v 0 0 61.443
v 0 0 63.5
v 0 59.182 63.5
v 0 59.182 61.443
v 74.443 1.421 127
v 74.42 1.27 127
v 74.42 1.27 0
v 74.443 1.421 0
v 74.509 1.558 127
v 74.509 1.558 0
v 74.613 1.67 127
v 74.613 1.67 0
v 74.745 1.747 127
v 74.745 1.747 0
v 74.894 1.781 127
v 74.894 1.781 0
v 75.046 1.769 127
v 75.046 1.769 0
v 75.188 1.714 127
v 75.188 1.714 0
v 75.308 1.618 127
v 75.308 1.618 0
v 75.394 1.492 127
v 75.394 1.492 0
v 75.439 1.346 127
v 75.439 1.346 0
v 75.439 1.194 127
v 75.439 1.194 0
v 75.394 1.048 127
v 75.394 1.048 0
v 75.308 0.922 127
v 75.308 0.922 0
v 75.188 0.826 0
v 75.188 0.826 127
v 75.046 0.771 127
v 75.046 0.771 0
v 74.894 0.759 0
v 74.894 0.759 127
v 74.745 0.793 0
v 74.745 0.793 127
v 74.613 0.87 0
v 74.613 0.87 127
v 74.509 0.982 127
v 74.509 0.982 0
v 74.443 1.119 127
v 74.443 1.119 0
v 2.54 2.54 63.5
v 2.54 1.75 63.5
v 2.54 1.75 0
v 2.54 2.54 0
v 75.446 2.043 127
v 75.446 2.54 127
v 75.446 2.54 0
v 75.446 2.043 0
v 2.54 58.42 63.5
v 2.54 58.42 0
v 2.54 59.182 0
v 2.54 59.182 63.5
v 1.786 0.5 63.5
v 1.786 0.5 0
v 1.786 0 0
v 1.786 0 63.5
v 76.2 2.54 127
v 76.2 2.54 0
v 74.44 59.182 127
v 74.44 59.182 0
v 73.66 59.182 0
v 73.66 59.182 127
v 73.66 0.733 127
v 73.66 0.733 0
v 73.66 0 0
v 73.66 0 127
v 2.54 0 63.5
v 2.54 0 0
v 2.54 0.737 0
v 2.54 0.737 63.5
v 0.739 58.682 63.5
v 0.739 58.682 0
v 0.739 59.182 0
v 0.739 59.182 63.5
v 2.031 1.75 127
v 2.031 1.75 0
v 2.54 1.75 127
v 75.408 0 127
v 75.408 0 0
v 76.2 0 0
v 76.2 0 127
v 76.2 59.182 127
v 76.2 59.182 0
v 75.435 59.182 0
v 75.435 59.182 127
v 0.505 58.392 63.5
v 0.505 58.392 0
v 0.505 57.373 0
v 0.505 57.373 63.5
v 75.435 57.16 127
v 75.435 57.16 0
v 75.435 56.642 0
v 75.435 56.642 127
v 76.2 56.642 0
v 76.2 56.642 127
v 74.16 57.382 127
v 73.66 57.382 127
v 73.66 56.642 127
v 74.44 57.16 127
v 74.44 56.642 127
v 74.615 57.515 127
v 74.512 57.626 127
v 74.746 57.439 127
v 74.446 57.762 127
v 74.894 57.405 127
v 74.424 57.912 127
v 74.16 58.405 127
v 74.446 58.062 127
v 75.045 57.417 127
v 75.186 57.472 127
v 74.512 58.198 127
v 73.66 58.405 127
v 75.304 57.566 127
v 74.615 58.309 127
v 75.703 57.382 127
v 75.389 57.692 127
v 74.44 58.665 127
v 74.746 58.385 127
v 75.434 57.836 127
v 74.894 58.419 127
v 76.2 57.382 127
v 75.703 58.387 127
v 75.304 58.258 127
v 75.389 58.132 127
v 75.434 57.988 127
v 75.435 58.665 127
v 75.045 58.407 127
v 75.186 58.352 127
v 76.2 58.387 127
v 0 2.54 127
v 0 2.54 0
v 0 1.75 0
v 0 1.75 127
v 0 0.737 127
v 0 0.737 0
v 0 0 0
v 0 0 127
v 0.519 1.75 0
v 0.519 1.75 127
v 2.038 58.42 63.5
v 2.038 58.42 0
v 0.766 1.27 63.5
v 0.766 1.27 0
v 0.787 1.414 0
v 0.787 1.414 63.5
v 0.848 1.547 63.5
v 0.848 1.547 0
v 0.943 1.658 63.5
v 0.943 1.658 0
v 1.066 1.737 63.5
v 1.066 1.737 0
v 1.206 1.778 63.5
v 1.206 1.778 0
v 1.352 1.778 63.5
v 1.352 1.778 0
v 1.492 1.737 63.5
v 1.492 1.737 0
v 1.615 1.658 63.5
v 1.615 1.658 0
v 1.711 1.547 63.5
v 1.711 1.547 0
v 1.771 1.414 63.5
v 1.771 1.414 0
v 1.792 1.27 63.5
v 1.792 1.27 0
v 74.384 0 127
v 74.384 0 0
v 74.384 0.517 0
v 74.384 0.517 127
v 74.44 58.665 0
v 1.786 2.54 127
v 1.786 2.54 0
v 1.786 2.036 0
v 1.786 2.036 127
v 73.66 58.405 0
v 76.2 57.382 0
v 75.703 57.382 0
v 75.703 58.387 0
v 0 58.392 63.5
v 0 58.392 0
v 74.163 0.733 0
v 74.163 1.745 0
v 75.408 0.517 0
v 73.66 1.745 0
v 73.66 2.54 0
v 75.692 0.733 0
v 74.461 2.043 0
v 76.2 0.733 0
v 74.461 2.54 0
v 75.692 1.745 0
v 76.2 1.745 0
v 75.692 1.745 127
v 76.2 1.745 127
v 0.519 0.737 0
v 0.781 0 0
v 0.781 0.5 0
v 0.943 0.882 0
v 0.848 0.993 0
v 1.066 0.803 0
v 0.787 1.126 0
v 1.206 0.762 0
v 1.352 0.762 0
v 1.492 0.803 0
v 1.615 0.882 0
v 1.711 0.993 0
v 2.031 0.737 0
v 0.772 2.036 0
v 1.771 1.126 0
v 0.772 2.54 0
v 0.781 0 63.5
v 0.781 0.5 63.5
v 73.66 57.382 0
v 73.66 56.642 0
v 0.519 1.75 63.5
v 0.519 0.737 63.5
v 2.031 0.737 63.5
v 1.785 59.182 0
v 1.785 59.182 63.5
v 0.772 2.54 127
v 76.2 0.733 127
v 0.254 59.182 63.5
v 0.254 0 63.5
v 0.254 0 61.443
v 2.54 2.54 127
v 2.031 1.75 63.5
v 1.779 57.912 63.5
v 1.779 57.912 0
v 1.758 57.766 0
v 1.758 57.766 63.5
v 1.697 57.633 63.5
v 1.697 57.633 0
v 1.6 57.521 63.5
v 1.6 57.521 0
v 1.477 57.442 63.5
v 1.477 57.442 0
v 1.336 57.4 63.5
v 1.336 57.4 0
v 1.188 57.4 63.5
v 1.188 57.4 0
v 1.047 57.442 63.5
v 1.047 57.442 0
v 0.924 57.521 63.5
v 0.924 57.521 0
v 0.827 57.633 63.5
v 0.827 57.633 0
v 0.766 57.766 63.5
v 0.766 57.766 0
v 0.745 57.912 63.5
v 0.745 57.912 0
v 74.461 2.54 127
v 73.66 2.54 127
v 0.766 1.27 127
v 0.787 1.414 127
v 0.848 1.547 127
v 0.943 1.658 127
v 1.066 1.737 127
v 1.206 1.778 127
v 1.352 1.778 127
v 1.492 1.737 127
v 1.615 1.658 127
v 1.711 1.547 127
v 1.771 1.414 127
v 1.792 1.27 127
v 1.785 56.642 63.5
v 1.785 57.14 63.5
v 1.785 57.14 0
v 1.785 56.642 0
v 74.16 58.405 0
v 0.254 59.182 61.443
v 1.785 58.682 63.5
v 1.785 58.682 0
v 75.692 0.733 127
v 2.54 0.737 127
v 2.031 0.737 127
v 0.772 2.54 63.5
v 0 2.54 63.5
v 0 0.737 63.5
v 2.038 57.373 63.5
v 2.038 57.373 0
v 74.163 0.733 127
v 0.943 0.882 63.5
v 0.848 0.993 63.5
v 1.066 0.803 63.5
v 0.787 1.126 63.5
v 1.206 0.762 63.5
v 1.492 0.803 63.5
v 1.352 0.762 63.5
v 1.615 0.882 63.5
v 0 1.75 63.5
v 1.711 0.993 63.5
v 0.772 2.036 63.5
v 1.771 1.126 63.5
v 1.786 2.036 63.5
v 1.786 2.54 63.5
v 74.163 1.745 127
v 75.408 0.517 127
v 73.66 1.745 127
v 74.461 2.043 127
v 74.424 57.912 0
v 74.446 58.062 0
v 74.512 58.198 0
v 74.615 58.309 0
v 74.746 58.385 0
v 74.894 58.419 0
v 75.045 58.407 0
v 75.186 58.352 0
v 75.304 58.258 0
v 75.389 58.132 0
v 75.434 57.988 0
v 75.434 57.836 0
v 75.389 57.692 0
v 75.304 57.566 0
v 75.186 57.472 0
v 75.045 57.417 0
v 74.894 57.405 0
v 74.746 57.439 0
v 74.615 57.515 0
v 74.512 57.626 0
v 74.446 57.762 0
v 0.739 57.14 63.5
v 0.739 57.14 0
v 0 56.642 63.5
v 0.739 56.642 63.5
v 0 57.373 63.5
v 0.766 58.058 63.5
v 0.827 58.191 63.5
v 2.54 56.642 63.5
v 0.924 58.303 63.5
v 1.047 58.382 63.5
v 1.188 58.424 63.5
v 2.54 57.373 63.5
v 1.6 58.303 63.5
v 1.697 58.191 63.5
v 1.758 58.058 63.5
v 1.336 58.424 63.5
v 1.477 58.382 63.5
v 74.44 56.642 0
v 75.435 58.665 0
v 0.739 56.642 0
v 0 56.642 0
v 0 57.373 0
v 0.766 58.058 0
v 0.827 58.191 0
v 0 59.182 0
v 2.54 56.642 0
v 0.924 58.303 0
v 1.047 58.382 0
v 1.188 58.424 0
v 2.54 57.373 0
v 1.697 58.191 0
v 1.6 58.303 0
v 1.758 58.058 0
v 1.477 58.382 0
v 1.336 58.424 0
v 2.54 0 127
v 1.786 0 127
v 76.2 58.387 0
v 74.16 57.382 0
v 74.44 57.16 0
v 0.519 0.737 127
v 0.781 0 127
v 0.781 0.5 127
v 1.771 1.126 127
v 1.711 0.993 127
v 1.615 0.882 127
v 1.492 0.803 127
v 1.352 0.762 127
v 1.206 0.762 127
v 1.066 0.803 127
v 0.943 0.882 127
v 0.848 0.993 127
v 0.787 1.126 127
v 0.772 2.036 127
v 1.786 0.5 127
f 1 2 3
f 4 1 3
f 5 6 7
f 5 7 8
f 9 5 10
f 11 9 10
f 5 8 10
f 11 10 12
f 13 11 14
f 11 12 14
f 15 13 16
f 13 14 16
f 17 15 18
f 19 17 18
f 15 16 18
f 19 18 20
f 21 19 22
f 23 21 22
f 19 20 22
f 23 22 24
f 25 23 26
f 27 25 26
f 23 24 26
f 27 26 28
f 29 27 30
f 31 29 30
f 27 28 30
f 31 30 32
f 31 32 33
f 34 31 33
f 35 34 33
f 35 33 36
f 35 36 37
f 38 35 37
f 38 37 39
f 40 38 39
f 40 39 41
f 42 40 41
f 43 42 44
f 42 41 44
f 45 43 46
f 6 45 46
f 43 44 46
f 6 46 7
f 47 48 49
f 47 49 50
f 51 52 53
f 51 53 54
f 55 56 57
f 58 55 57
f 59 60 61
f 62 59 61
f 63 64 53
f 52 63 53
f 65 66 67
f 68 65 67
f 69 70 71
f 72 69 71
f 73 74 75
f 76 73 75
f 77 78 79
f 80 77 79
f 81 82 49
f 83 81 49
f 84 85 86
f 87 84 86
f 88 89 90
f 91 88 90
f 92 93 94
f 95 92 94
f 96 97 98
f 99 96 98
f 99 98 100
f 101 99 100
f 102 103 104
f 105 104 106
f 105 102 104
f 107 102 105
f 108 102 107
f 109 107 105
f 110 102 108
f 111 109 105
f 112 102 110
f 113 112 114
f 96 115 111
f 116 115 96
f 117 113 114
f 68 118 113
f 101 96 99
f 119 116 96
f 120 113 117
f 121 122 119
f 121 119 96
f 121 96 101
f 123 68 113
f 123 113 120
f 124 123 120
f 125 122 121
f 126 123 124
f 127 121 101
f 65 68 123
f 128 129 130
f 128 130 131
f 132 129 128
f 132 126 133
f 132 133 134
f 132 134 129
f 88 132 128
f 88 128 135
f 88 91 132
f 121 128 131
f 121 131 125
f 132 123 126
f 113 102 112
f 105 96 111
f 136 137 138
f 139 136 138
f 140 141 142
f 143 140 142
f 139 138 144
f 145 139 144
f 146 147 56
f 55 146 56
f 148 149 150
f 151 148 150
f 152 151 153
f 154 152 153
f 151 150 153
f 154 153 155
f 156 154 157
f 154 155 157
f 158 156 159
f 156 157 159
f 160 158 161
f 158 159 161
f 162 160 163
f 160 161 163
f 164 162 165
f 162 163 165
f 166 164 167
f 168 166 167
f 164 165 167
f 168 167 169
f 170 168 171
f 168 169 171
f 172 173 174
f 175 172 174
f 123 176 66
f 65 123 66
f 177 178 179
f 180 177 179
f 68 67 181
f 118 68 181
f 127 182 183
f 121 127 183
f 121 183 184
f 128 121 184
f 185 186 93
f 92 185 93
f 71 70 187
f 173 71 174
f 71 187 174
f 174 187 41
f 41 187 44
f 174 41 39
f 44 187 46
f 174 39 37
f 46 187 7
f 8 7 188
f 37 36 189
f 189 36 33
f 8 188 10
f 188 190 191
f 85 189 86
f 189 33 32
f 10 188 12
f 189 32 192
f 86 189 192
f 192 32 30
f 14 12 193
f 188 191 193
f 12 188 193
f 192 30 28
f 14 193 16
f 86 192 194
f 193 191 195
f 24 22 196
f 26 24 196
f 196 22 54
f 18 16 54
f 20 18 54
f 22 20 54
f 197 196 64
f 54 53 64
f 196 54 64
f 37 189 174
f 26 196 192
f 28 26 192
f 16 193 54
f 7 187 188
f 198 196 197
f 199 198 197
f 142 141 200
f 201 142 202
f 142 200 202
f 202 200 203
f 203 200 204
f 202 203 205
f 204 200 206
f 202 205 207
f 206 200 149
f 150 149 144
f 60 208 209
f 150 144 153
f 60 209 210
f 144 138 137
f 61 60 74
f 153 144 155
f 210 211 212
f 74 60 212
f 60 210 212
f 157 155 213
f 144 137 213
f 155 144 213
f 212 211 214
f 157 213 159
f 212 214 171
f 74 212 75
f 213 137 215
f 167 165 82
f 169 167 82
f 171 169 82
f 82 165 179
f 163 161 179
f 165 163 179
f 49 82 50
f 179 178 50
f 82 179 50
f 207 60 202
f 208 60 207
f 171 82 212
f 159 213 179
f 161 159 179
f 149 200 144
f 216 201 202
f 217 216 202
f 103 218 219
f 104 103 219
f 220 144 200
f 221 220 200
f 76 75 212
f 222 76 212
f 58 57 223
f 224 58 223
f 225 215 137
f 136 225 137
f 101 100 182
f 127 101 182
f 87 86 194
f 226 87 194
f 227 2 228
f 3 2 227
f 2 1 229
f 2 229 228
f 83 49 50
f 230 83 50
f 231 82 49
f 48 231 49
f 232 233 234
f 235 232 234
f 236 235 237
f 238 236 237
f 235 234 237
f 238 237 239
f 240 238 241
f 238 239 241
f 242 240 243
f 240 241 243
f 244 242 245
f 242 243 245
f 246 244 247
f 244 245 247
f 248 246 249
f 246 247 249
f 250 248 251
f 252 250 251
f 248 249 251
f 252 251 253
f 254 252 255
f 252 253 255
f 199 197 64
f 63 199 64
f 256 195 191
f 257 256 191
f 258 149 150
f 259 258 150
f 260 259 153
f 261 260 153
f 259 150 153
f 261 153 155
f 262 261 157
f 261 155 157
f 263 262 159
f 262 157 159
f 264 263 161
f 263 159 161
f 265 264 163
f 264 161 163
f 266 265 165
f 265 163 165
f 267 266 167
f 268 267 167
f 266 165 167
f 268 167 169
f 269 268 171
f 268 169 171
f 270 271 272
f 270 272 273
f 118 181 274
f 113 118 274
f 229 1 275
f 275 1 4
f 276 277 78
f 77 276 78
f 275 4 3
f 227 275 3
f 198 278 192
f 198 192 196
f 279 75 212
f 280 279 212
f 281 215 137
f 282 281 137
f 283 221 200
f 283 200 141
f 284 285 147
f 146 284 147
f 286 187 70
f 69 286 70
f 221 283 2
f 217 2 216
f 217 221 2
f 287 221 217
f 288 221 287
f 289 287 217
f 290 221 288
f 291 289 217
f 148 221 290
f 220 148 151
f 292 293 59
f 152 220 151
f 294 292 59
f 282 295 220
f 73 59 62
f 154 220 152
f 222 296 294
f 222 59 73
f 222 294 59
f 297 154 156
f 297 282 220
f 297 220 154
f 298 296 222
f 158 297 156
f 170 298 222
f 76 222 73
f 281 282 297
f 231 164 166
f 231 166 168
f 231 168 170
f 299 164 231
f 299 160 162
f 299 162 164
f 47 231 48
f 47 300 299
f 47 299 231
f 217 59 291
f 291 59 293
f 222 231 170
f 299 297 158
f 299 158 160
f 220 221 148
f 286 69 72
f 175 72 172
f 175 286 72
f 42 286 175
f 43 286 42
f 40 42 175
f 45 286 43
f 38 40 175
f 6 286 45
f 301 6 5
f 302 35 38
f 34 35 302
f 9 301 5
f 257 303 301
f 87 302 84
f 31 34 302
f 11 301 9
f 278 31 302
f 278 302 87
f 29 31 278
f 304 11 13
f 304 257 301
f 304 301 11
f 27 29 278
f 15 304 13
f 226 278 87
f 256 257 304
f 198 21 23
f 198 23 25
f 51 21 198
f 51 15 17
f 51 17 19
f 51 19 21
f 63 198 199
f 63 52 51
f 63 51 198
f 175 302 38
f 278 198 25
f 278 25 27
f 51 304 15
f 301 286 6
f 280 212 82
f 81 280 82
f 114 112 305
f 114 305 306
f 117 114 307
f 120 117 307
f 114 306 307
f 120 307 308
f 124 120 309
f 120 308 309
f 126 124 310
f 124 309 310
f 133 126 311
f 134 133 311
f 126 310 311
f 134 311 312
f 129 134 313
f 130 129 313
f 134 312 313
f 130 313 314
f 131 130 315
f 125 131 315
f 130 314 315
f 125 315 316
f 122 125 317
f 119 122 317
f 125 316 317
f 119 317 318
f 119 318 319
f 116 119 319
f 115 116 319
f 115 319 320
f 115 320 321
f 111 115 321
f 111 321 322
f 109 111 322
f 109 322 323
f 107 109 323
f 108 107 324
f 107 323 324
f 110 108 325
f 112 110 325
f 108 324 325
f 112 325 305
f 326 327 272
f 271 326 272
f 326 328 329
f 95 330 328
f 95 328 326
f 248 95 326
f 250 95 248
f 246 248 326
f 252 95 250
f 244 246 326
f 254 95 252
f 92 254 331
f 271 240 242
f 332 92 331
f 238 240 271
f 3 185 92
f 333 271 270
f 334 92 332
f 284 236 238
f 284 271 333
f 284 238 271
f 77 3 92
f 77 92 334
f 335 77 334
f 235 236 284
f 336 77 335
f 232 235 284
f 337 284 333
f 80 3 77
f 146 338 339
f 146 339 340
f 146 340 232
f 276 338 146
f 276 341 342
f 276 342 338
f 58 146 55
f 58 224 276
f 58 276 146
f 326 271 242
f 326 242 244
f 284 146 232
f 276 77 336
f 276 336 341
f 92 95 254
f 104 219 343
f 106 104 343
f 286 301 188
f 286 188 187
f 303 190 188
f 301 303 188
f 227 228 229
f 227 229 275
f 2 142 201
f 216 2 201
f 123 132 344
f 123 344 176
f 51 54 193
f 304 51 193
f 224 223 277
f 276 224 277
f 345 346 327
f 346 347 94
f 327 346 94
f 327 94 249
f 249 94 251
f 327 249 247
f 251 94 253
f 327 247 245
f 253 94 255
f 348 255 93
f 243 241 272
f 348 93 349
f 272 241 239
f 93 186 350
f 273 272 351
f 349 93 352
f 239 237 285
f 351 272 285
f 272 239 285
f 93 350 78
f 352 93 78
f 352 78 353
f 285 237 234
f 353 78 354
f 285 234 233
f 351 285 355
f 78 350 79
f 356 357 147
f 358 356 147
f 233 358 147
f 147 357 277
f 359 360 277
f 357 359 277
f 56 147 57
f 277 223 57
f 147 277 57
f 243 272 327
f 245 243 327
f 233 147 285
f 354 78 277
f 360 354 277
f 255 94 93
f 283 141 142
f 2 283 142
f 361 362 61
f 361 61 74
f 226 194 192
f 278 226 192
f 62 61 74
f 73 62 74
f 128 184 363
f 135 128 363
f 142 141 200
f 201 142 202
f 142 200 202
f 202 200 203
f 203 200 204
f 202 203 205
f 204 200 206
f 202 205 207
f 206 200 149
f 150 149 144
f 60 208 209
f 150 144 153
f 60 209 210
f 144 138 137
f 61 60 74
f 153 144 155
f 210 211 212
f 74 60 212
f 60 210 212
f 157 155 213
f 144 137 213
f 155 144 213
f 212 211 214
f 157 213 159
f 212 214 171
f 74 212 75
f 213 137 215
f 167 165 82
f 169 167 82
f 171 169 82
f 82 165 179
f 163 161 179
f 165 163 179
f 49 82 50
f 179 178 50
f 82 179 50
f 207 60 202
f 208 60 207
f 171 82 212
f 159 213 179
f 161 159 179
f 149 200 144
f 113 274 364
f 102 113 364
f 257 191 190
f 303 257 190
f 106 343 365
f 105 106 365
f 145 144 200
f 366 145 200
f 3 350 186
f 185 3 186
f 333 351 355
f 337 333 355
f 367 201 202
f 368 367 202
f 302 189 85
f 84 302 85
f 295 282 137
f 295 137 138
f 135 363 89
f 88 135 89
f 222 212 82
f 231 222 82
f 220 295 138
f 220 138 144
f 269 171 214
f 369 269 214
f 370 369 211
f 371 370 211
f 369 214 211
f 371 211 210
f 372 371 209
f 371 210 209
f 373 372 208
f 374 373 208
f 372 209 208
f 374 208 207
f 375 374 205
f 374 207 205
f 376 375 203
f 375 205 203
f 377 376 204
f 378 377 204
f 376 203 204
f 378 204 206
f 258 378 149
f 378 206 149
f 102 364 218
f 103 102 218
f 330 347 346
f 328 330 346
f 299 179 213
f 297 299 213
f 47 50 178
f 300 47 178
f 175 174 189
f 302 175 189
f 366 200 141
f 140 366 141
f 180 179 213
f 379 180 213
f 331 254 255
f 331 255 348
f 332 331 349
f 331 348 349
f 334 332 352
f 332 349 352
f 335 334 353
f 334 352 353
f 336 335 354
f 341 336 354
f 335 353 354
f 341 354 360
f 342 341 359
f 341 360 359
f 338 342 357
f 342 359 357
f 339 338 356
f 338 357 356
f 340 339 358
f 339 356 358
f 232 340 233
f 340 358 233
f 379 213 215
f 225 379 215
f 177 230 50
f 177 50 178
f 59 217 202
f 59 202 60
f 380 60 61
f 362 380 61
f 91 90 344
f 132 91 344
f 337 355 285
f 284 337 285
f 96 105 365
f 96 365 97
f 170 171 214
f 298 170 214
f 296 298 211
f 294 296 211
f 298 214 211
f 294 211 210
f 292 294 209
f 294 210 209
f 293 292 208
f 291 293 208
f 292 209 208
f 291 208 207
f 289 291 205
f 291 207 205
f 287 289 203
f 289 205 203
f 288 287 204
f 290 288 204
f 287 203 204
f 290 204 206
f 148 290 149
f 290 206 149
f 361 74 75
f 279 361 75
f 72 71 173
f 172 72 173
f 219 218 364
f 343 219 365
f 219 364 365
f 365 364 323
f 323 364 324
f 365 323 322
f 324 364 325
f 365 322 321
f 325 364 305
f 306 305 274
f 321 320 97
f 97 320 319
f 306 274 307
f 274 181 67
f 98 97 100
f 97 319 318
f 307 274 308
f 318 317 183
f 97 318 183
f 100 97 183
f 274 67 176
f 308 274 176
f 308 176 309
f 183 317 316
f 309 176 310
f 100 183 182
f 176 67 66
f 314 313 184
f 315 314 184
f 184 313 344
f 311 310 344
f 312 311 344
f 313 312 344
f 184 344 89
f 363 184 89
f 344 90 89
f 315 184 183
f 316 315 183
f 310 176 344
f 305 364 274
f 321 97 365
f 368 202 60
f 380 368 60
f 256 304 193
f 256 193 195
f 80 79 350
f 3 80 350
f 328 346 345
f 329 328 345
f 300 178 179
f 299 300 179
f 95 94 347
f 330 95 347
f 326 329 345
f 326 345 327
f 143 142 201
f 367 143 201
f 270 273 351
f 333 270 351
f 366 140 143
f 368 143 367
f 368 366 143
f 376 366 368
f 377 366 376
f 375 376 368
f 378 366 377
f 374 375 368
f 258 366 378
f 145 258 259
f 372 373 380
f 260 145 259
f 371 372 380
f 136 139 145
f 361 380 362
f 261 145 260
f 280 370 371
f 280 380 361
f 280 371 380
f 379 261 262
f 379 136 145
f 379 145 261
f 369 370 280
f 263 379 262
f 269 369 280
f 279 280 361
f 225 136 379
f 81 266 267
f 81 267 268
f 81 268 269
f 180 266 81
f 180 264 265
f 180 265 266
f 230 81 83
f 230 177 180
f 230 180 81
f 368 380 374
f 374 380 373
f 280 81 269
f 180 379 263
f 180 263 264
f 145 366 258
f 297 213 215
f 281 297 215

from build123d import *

# Parameters (mm, degrees)
F1_DEPTH = 127
F2_W     = 59.182
F2_H     = 2.0574
F3_DEPTH = 0.254
F4_DEPTH = 63.5


with BuildPart() as f1:
    # F0 (on Top) → F1 (new body)
    with BuildSketch(Plane.XY):
        Polygon((75.435355, 56.642), (76.2, 56.642), (76.2, 57.382349), (75.703458, 57.382349), (75.703458, 58.387429), (76.2, 58.387429), (76.2, 59.182), (75.435355, 59.182), (75.435355, 58.665238), (74.439637, 58.665238), (74.439637, 59.182), (73.66, 59.182), (73.66, 58.405377), (74.159944, 58.405377), (74.159944, 57.912), (74.159944, 57.382349), (73.66, 57.382349), (73.66, 56.642), (74.439637, 56.642), (74.439637, 57.159521), (75.435355, 57.159521), align=None)
        with BuildLine():
            ThreePointArc((75.439701, 57.912), (74.931701, 57.404), (74.423701, 57.912))
            ThreePointArc((74.423701, 57.912), (74.931701, 58.42), (75.439701, 57.912))
        make_face(mode=Mode.SUBTRACT)
        Polygon((73.66, 0.73318), (73.66, 0), (74.383944, 0), (74.383944, 0.516951), (75.407833, 0.516951), (75.407833, 0), (76.2, 0), (76.2, 0.73318), (75.692, 0.73318), (75.692, 1.745307), (76.2, 1.745307), (76.2, 2.54), (75.446472, 2.54), (75.446472, 2.043123), (74.461222, 2.043123), (74.461222, 2.54), (73.66, 2.54), (73.66, 1.745307), (74.163118, 1.745307), (74.163118, 1.27), (74.163118, 0.73318), align=None)
        with BuildLine():
            ThreePointArc((75.444446, 1.27), (74.932334, 0.757888), (74.420222, 1.27))
            ThreePointArc((74.420222, 1.27), (74.932334, 1.782112), (75.444446, 1.27))
        make_face(mode=Mode.SUBTRACT)
        Polygon((0, 0.736638), (0, 0), (0.780634, 0), (0.780634, 0.499567), (1.786142, 0.499567), (1.786142, 0), (2.54, 0), (2.54, 0.736638), (2.031388, 0.736638), (2.031388, 1.750321), (2.54, 1.750321), (2.54, 2.54), (1.786142, 2.54), (1.786142, 2.036441), (0.772459, 2.036441), (0.772459, 2.54), (0, 2.54), (0, 1.750321), (0.519038, 1.750321), (0.519038, 1.27), (0.519038, 0.736638), align=None)
        with BuildLine():
            ThreePointArc((1.792188, 1.27), (1.2793, 0.757113), (0.766413, 1.27))
            ThreePointArc((0.766413, 1.27), (1.2793, 1.782887), (1.792188, 1.27))
        make_face(mode=Mode.SUBTRACT)
    extrude(amount=F1_DEPTH)


with BuildPart() as f3:
    # F2 (on Right) → F3 (new body)
    with BuildSketch(Plane.YZ):
        with Locations((29.591, 62.4713)):
            Rectangle(F2_W, F2_H)
    extrude(amount=F3_DEPTH)


with BuildPart() as f4:
    # F0 (on Top) → F4 (new body)
    with BuildSketch(Plane.XY):
        Polygon((0, 0.736638), (0, 0), (0.780634, 0), (0.780634, 0.499567), (1.786142, 0.499567), (1.786142, 0), (2.54, 0), (2.54, 0.736638), (2.031388, 0.736638), (2.031388, 1.750321), (2.54, 1.750321), (2.54, 2.54), (1.786142, 2.54), (1.786142, 2.036441), (0.772459, 2.036441), (0.772459, 2.54), (0, 2.54), (0, 1.750321), (0.519038, 1.750321), (0.519038, 1.27), (0.519038, 0.736638), align=None)
        with BuildLine():
            ThreePointArc((1.792188, 1.27), (1.2793, 0.757113), (0.766413, 1.27))
            ThreePointArc((0.766413, 1.27), (1.2793, 1.782887), (1.792188, 1.27))
        make_face(mode=Mode.SUBTRACT)
        Polygon((0, 57.373393), (0, 56.642), (0.738544, 56.642), (0.738544, 57.139702), (1.78547, 57.139702), (1.78547, 56.642), (2.54, 56.642), (2.54, 57.373393), (2.037854, 57.373393), (2.037854, 58.42), (2.54, 58.42), (2.54, 59.182), (1.78547, 59.182), (1.78547, 58.682051), (0.738544, 58.682051), (0.738544, 59.182), (0, 59.182), (0, 58.392275), (0.504856, 58.392275), (0.504856, 57.912), (0.504856, 57.373393), align=None)
        with BuildLine():
            ThreePointArc((1.77885, 57.912), (1.262007, 57.395158), (0.745165, 57.912))
            ThreePointArc((0.745165, 57.912), (1.262007, 58.428842), (1.77885, 57.912))
        make_face(mode=Mode.SUBTRACT)
    extrude(amount=F4_DEPTH)


solid = Compound([f1.part, f3.part, f4.part])
